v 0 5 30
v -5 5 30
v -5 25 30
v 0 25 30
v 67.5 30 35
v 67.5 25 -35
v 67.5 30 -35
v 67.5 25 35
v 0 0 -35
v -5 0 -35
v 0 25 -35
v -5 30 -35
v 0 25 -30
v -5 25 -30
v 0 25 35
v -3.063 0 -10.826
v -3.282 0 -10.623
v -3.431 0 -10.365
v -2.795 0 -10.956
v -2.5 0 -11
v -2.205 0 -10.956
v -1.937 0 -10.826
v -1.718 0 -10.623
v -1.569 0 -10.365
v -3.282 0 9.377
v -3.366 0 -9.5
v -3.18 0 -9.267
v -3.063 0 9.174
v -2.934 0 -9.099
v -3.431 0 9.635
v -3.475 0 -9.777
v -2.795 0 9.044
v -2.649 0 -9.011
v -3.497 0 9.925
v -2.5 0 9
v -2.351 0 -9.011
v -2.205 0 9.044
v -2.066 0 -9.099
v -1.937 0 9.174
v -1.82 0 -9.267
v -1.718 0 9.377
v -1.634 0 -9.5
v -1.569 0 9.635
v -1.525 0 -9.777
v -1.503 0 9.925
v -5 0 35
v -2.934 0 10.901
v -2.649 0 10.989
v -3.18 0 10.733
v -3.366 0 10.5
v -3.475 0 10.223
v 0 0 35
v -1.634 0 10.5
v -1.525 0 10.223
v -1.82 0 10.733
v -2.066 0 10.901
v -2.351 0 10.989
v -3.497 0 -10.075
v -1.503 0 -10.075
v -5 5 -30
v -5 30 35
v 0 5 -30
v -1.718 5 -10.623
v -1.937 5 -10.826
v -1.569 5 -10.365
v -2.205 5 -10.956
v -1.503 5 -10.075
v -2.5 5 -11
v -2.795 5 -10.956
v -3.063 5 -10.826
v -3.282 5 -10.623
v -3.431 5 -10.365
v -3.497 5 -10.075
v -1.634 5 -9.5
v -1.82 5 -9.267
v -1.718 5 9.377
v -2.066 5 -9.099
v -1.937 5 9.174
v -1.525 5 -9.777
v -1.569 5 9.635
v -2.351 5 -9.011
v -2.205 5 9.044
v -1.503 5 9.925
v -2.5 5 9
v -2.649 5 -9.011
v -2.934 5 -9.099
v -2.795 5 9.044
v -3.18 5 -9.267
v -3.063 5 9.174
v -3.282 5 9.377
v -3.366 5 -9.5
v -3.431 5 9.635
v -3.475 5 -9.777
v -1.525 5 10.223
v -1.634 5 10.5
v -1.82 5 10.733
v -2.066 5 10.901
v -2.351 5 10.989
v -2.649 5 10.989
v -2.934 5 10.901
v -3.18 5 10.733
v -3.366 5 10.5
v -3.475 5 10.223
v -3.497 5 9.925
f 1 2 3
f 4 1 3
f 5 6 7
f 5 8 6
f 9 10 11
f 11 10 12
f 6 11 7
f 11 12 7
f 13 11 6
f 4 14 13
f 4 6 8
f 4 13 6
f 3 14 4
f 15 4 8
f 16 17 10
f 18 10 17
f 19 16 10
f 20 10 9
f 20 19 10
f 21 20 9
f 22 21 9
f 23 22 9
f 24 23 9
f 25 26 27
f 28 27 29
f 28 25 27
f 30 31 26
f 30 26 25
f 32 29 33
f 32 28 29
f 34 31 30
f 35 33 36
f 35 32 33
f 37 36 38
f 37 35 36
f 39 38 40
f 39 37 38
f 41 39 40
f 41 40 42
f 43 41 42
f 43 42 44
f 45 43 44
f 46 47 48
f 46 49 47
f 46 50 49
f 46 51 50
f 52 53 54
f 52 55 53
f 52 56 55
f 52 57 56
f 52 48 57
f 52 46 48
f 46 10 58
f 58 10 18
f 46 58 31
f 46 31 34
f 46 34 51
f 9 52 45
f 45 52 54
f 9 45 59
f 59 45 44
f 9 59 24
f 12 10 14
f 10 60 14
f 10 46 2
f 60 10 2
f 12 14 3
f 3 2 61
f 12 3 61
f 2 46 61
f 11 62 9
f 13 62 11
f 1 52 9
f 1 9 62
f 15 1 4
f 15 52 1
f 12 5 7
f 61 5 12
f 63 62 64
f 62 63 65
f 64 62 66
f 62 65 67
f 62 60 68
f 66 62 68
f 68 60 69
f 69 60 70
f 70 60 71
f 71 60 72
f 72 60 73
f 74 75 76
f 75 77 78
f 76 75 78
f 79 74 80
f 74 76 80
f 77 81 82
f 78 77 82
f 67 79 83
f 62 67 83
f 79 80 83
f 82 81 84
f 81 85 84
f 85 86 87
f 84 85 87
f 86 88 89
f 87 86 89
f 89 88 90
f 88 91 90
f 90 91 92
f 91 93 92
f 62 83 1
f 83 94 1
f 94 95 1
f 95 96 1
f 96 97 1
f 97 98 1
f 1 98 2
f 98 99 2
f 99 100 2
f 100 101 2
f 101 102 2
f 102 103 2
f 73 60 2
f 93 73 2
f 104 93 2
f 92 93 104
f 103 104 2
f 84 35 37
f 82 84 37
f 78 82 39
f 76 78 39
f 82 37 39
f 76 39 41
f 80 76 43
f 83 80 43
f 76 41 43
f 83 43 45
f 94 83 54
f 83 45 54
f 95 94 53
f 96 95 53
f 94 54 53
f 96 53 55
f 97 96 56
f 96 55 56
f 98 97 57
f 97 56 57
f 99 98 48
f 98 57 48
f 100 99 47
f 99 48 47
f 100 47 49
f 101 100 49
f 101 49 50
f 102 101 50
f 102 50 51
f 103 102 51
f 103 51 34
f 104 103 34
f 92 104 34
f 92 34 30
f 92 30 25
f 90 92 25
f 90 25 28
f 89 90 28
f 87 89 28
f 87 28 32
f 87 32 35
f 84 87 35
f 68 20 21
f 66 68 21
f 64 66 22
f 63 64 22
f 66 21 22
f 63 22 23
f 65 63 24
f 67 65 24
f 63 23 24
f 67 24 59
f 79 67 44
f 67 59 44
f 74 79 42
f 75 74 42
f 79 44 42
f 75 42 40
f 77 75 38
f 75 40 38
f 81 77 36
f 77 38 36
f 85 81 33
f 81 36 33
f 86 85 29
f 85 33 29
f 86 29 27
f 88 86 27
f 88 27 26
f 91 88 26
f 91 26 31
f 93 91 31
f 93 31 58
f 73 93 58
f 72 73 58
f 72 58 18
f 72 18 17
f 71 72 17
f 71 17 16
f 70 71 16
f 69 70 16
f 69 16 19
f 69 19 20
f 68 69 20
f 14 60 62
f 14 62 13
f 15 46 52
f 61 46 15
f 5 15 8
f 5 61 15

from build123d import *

# Parameters (mm, degrees)
SKETCH1_W           = 5
SKETCH1_H           = 30
SKETCH1_W_2         = 67.5
SKETCH1_H_2         = 5
BOSS_EXTRUDE1_DEPTH = 35
SKETCH2_R           = 1
CUT_EXTRUDE1_DEPTH  = 10
SKETCH3_W           = 60
SKETCH3_H           = 20
CUT_EXTRUDE2_DEPTH  = 10


with BuildPart() as part:
    # Sketch1 → Boss-Extrude1 (new, symmetric)
    with BuildSketch(Plane.XY):
        with Locations((-2.5, 15)):
            Rectangle(SKETCH1_W, SKETCH1_H)
        with Locations((33.75, 27.5)):
            Rectangle(SKETCH1_W_2, SKETCH1_H_2)
    extrude(amount=BOSS_EXTRUDE1_DEPTH, both=True)

    # Sketch2 → Cut-Extrude1 (cut)
    with BuildSketch(Plane.XZ):
        with Locations(Location((-2.5, 10, 0), (0, 0, 270))):
            Circle(SKETCH2_R)
        with Locations(Location((-2.5, -10, 0), (0, 0, 270))):
            Circle(SKETCH2_R)
    extrude(amount=-CUT_EXTRUDE1_DEPTH, mode=Mode.SUBTRACT)

    # Sketch3 → Cut-Extrude2 (cut)
    with BuildSketch(Plane.ZY.offset(5)):
        with Locations((0, 15)):
            Rectangle(SKETCH3_W, SKETCH3_H)
    extrude(amount=-CUT_EXTRUDE2_DEPTH, mode=Mode.SUBTRACT)


solid = part.part
